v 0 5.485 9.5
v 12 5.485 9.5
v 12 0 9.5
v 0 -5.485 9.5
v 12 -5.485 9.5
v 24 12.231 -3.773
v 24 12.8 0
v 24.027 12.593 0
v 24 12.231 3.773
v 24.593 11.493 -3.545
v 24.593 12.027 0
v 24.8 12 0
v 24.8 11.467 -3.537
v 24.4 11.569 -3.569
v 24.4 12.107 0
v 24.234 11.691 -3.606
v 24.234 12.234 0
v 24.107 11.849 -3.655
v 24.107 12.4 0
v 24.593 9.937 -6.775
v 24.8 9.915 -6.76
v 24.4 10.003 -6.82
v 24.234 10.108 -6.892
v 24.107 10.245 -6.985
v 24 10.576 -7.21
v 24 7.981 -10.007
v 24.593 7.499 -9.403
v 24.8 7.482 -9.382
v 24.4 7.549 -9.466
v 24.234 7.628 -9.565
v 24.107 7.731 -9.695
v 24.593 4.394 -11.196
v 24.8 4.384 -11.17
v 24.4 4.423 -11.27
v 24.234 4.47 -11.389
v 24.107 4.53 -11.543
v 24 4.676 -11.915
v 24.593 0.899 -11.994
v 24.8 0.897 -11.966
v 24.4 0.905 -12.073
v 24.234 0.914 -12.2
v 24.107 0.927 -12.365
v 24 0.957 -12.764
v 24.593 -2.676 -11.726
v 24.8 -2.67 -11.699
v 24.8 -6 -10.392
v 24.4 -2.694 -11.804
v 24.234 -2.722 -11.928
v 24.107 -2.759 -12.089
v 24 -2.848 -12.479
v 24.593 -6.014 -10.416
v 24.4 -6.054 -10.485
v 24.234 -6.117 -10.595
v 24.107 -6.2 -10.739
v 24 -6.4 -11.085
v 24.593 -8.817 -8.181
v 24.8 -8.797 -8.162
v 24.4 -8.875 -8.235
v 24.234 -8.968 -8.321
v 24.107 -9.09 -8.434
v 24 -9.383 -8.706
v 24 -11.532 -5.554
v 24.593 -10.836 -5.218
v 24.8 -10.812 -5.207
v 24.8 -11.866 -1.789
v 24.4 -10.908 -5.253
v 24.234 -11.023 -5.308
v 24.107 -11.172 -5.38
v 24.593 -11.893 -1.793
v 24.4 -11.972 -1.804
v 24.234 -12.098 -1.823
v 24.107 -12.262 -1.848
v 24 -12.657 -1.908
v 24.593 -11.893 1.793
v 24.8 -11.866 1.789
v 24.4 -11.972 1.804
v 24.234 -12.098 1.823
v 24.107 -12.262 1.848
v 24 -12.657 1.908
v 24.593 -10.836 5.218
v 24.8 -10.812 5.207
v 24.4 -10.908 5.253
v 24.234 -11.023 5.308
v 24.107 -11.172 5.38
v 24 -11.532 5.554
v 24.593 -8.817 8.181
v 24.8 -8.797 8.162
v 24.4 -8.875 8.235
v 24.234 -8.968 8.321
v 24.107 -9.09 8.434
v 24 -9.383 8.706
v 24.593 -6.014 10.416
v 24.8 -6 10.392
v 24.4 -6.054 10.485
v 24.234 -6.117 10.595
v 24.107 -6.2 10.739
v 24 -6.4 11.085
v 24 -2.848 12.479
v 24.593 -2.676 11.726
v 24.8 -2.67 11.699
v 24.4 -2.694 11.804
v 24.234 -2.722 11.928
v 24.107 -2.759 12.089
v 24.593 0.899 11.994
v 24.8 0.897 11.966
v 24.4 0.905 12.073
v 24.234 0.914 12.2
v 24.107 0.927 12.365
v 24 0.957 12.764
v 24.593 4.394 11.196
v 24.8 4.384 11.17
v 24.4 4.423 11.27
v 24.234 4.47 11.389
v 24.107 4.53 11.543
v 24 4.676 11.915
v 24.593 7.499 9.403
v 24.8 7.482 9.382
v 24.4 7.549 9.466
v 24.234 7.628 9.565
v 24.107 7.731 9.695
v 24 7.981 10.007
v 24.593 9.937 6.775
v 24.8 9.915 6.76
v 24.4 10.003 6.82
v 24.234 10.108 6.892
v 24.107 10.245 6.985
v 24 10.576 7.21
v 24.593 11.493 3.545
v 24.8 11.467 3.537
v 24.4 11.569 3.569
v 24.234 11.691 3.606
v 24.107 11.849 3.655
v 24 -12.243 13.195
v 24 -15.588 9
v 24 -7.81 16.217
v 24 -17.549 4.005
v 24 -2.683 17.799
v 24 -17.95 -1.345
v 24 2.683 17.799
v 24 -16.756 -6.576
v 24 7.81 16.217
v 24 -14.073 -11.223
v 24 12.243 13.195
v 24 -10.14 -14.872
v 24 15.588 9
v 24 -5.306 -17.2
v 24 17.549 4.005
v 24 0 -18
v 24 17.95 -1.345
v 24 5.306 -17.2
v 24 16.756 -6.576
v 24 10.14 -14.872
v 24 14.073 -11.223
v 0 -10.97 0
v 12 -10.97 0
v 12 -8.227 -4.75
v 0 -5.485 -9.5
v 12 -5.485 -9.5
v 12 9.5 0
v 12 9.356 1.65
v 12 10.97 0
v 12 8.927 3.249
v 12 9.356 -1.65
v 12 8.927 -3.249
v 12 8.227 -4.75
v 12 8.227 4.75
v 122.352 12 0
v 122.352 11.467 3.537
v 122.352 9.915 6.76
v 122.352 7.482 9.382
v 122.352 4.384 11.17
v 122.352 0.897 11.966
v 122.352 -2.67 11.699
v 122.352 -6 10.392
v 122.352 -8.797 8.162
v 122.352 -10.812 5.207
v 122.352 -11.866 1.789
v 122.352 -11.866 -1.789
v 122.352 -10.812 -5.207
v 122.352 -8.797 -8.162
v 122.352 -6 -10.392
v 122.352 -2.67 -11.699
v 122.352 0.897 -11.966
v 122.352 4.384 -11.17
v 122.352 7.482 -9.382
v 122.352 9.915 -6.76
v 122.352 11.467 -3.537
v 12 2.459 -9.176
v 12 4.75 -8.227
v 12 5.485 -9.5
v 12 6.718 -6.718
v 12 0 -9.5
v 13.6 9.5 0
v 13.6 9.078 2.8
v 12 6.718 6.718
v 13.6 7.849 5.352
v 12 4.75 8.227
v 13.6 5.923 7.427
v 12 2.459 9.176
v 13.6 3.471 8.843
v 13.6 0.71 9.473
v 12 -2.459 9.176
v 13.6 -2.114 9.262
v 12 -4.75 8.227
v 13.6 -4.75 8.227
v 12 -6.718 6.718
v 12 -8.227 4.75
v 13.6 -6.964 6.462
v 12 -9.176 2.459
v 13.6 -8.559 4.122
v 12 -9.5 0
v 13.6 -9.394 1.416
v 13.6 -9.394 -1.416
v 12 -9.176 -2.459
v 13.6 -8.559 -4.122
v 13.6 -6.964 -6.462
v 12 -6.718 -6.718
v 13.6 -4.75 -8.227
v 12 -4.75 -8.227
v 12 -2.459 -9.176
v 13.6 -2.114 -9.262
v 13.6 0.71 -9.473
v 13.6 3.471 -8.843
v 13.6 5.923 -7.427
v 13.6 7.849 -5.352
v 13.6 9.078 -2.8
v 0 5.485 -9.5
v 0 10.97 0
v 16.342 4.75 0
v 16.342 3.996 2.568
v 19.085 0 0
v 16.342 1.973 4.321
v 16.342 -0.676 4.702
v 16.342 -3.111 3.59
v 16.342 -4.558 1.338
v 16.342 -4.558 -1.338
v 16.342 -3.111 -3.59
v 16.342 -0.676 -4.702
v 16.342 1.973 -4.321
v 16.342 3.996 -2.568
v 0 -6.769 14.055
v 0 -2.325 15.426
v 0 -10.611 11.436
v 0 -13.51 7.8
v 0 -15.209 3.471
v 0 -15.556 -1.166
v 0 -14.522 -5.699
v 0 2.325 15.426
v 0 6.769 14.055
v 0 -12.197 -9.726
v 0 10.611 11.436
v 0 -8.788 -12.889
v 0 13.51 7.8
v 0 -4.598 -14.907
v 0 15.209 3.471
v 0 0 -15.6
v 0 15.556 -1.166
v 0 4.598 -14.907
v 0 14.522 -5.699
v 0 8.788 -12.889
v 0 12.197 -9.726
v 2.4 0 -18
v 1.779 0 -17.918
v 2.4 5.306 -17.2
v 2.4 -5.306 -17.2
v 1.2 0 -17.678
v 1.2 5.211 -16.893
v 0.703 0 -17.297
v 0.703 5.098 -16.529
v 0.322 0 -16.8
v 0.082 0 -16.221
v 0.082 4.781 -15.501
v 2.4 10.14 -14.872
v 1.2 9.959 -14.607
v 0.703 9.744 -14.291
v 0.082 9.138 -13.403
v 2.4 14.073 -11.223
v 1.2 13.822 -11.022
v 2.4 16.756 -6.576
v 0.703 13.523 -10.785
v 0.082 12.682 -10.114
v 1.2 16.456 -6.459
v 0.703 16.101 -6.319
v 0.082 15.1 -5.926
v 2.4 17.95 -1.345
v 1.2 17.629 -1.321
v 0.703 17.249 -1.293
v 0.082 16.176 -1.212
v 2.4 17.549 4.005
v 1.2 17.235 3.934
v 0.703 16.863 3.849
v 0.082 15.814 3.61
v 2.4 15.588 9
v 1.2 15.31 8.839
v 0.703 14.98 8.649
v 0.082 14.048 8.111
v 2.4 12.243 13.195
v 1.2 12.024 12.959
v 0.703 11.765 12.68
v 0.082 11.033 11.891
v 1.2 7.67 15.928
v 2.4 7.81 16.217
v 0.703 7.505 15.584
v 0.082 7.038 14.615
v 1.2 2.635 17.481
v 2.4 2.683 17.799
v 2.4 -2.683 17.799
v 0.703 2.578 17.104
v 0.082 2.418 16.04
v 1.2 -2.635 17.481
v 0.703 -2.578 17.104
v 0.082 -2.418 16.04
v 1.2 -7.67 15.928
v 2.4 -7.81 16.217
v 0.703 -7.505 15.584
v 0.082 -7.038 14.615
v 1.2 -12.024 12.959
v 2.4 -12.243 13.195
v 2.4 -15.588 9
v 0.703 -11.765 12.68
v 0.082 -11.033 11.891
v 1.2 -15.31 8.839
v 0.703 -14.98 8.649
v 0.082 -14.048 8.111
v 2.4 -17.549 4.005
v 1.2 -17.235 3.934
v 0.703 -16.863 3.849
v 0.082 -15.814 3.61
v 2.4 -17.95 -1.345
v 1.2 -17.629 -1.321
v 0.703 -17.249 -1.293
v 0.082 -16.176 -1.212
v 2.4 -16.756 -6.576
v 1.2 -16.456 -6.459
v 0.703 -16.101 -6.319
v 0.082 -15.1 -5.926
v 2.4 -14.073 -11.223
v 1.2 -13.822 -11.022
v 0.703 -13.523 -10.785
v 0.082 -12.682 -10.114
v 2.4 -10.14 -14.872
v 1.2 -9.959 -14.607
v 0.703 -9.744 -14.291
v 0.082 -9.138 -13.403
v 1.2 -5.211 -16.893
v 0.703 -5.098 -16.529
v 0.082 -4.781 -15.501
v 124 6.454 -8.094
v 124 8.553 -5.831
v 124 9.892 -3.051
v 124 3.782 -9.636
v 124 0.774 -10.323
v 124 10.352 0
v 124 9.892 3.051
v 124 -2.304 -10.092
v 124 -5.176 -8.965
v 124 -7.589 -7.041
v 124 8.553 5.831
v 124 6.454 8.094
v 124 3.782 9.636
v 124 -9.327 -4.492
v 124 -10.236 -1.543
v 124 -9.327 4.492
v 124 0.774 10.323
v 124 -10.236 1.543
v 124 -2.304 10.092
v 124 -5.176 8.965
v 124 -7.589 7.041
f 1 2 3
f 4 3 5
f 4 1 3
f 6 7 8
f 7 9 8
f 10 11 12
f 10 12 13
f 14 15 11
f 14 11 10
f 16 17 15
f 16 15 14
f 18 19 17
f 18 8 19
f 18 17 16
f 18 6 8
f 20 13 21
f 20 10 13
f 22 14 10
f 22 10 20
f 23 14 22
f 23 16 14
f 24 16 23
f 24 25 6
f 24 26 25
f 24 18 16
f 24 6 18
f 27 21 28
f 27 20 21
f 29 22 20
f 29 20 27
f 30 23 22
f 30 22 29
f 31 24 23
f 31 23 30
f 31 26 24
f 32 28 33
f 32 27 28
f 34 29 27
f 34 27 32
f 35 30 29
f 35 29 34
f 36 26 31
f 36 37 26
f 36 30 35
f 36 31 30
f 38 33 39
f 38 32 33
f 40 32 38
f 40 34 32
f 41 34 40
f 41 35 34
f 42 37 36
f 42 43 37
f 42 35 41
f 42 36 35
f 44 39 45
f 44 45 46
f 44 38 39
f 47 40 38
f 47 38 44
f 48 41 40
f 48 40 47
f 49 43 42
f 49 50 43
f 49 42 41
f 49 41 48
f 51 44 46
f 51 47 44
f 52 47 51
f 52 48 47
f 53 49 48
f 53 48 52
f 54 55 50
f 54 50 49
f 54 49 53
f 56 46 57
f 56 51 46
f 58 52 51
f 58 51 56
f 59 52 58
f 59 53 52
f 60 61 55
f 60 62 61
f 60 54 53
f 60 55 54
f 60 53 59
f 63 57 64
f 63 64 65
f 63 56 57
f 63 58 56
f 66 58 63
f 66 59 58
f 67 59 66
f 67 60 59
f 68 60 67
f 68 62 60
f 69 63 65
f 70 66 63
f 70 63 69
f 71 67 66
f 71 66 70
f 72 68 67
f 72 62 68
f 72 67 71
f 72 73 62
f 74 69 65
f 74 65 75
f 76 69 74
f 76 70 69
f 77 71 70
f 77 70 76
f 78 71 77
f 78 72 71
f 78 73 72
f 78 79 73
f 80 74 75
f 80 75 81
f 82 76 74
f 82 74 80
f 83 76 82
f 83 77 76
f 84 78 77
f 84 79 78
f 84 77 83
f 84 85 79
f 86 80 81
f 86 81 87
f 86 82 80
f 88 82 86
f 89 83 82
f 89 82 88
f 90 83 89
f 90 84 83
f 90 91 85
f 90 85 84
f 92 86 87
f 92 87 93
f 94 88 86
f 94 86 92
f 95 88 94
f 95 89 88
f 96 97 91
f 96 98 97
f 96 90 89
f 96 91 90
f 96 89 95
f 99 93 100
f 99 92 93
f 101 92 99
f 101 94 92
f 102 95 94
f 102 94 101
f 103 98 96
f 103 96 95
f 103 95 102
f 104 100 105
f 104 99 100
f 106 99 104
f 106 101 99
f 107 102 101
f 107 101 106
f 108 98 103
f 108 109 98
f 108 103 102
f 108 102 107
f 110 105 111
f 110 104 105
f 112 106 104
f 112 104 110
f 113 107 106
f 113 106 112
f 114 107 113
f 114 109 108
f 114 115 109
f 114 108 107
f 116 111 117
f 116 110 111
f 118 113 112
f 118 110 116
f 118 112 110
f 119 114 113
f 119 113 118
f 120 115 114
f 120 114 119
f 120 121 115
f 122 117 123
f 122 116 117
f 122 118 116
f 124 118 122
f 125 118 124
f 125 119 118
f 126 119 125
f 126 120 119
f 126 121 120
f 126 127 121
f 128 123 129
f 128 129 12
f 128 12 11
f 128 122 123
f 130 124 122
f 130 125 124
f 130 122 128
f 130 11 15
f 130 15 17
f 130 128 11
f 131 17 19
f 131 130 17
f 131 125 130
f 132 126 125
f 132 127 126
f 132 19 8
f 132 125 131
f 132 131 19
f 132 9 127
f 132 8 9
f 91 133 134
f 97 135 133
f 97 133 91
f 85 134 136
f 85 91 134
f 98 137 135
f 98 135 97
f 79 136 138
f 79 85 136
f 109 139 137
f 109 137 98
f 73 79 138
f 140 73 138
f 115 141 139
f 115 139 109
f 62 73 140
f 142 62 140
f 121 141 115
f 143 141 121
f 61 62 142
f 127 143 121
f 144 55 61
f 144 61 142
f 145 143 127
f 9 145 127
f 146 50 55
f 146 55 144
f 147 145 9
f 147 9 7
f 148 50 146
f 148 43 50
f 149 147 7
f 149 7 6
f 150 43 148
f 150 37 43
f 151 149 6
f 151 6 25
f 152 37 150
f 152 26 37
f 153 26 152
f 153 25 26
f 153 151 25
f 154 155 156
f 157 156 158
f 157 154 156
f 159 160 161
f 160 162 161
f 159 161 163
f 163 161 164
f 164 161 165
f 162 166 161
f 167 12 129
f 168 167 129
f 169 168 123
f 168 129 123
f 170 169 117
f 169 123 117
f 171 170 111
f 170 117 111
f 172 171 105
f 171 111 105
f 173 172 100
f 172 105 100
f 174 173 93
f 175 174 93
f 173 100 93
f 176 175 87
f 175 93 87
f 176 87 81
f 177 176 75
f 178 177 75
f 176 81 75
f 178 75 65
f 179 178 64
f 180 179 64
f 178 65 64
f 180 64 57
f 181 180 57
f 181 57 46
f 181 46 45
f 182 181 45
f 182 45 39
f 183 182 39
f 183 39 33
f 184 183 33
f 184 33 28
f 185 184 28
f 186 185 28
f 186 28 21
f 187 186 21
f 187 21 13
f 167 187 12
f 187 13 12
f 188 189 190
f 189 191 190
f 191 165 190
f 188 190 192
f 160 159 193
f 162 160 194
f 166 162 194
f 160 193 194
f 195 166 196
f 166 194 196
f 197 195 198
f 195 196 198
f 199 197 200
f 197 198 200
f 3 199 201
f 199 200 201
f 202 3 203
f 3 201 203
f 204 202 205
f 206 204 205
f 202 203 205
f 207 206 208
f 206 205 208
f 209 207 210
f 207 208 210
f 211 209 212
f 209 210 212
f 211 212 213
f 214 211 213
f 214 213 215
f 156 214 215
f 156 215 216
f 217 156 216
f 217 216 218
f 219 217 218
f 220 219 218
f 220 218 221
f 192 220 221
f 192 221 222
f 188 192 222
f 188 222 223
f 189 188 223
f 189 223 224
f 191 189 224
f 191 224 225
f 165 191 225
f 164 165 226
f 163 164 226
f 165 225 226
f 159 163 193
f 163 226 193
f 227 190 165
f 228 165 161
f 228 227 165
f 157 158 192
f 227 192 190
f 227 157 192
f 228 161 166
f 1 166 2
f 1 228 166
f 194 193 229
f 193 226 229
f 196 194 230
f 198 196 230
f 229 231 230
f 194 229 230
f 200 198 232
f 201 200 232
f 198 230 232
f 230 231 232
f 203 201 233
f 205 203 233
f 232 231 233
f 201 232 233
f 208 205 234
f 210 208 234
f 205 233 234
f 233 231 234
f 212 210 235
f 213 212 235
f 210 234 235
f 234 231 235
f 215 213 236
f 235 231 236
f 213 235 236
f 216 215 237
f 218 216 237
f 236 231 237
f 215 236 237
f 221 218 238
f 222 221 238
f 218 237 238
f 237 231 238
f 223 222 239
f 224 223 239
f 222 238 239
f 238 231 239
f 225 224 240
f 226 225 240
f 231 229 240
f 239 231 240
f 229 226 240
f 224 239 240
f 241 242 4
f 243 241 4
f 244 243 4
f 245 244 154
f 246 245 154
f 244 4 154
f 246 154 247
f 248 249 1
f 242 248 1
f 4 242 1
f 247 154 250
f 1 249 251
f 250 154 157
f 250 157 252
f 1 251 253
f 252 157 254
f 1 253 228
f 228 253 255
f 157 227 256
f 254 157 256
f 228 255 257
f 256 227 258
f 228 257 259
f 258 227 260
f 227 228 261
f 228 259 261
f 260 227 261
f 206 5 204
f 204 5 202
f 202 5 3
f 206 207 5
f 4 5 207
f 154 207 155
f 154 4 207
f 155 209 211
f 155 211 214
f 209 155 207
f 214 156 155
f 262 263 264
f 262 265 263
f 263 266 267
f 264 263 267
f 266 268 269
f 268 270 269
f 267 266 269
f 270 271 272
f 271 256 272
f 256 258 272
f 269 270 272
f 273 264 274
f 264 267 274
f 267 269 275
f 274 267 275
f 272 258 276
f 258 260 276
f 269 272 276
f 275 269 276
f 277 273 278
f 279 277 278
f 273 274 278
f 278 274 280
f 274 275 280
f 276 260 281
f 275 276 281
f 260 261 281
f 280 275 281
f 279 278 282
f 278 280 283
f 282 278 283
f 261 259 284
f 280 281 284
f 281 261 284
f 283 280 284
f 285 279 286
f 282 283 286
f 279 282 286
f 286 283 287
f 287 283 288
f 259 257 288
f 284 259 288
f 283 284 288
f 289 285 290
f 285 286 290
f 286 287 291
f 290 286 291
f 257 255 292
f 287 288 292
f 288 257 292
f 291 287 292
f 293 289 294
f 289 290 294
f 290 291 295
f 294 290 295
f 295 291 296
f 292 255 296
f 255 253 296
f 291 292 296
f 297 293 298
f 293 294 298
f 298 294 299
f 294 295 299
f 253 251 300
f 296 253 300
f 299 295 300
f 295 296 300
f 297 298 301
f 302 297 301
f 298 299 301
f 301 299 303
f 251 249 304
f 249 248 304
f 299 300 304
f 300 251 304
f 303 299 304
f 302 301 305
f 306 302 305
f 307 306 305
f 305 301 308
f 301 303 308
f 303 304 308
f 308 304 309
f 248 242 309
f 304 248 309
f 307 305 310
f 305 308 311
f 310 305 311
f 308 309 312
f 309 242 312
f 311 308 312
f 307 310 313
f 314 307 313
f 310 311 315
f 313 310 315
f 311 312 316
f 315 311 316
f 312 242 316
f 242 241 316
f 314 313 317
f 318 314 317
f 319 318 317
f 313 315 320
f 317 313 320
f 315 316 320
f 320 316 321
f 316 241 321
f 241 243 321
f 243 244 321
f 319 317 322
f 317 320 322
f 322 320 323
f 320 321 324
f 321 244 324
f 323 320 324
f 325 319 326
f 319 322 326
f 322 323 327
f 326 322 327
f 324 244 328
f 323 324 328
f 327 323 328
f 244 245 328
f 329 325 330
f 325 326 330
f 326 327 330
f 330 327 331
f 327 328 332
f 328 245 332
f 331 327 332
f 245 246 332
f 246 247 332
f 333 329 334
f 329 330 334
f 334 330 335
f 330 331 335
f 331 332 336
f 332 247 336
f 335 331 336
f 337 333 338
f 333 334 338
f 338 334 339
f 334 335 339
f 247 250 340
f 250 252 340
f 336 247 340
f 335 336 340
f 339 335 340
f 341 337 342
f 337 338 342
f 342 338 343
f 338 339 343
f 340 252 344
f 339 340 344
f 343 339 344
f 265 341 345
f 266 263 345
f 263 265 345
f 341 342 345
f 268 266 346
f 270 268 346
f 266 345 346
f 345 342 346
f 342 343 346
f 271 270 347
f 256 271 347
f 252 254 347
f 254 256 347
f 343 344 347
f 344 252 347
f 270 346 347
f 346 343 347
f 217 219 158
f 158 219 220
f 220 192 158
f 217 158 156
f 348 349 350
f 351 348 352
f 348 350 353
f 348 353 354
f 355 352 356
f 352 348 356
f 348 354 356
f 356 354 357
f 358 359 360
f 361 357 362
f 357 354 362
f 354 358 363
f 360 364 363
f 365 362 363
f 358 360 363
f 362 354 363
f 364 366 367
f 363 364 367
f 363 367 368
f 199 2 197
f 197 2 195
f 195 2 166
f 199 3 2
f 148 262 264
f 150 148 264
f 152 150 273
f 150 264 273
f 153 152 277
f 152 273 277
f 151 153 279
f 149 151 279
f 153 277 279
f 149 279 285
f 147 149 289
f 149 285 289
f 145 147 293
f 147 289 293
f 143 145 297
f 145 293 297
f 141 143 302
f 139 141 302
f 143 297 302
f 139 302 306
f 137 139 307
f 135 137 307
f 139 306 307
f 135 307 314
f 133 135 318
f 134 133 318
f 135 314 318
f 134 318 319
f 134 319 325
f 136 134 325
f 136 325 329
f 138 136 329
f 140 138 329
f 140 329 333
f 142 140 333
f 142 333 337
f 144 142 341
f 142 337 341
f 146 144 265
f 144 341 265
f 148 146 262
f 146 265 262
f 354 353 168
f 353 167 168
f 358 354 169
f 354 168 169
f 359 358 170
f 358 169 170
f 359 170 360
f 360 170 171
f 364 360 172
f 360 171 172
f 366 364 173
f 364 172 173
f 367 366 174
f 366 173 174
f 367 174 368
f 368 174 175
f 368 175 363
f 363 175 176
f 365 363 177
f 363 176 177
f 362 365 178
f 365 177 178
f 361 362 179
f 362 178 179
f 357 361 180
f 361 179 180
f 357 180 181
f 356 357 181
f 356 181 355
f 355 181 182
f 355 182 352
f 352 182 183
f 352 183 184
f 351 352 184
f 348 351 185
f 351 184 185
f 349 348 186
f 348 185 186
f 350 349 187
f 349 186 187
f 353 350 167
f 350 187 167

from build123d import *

# Parameters (mm, degrees)
BASEHEADSKE_R   = 18
BASEHEAD_DEPTH  = 24
CUTSOCKET_DEPTH = 12
FILLET1_R       = 0.8
FILLET2_R       = 2.4


with BuildPart() as part:
    # BaseHeadSke → BaseHead (new body)
    with BuildSketch(Plane(origin=(0, 0, 0), x_dir=(0, 0, -1), z_dir=(1, 0, 0))):
        Circle(BASEHEADSKE_R)
    extrude(amount=BASEHEAD_DEPTH)

    # BodySke → BaseBody (revolve)
    with BuildSketch(Plane.XY):
        Polygon((0, 0), (124, 0), (124, 10.352), (122.352, 12), (0, 12), align=None)
    revolve(axis=Axis((0, 0, 0), (1, 0, 0)))

    # CutSocketSke → CutSocket (cut)
    with BuildSketch(Plane(origin=(0, 0, 0), x_dir=(0, 0, -1), z_dir=(1, 0, 0))):
        Polygon((0, 10.969655115), (-9.5, 5.484827557), (-9.5, -5.484827557), (0, -10.969655115), (9.5, -5.484827557), (9.5, 5.484827557), align=None)
    extrude(amount=CUTSOCKET_DEPTH, mode=Mode.SUBTRACT)

    # CutHoleSke → CutHole (revolve, cut)
    with BuildSketch(Plane.XY):
        Polygon((0, 9.5), (13.6, 9.5), (19.084827557, 0), (0, 0), align=None)
    revolve(axis=Axis((0, 0, 0), (1, 0, 0)), mode=Mode.SUBTRACT)

    # Fillet1
    fillet1_edges = [part.edges().sort_by_distance(p)[0] for p in [
        (24, -12, 0),
    ]]
    fillet(fillet1_edges, radius=FILLET1_R)

    # Fillet2
    fillet2_edges = [part.edges().sort_by_distance(p)[0] for p in [
        (0, 0, 18),
    ]]
    fillet(fillet2_edges, radius=FILLET2_R)


solid = part.part
